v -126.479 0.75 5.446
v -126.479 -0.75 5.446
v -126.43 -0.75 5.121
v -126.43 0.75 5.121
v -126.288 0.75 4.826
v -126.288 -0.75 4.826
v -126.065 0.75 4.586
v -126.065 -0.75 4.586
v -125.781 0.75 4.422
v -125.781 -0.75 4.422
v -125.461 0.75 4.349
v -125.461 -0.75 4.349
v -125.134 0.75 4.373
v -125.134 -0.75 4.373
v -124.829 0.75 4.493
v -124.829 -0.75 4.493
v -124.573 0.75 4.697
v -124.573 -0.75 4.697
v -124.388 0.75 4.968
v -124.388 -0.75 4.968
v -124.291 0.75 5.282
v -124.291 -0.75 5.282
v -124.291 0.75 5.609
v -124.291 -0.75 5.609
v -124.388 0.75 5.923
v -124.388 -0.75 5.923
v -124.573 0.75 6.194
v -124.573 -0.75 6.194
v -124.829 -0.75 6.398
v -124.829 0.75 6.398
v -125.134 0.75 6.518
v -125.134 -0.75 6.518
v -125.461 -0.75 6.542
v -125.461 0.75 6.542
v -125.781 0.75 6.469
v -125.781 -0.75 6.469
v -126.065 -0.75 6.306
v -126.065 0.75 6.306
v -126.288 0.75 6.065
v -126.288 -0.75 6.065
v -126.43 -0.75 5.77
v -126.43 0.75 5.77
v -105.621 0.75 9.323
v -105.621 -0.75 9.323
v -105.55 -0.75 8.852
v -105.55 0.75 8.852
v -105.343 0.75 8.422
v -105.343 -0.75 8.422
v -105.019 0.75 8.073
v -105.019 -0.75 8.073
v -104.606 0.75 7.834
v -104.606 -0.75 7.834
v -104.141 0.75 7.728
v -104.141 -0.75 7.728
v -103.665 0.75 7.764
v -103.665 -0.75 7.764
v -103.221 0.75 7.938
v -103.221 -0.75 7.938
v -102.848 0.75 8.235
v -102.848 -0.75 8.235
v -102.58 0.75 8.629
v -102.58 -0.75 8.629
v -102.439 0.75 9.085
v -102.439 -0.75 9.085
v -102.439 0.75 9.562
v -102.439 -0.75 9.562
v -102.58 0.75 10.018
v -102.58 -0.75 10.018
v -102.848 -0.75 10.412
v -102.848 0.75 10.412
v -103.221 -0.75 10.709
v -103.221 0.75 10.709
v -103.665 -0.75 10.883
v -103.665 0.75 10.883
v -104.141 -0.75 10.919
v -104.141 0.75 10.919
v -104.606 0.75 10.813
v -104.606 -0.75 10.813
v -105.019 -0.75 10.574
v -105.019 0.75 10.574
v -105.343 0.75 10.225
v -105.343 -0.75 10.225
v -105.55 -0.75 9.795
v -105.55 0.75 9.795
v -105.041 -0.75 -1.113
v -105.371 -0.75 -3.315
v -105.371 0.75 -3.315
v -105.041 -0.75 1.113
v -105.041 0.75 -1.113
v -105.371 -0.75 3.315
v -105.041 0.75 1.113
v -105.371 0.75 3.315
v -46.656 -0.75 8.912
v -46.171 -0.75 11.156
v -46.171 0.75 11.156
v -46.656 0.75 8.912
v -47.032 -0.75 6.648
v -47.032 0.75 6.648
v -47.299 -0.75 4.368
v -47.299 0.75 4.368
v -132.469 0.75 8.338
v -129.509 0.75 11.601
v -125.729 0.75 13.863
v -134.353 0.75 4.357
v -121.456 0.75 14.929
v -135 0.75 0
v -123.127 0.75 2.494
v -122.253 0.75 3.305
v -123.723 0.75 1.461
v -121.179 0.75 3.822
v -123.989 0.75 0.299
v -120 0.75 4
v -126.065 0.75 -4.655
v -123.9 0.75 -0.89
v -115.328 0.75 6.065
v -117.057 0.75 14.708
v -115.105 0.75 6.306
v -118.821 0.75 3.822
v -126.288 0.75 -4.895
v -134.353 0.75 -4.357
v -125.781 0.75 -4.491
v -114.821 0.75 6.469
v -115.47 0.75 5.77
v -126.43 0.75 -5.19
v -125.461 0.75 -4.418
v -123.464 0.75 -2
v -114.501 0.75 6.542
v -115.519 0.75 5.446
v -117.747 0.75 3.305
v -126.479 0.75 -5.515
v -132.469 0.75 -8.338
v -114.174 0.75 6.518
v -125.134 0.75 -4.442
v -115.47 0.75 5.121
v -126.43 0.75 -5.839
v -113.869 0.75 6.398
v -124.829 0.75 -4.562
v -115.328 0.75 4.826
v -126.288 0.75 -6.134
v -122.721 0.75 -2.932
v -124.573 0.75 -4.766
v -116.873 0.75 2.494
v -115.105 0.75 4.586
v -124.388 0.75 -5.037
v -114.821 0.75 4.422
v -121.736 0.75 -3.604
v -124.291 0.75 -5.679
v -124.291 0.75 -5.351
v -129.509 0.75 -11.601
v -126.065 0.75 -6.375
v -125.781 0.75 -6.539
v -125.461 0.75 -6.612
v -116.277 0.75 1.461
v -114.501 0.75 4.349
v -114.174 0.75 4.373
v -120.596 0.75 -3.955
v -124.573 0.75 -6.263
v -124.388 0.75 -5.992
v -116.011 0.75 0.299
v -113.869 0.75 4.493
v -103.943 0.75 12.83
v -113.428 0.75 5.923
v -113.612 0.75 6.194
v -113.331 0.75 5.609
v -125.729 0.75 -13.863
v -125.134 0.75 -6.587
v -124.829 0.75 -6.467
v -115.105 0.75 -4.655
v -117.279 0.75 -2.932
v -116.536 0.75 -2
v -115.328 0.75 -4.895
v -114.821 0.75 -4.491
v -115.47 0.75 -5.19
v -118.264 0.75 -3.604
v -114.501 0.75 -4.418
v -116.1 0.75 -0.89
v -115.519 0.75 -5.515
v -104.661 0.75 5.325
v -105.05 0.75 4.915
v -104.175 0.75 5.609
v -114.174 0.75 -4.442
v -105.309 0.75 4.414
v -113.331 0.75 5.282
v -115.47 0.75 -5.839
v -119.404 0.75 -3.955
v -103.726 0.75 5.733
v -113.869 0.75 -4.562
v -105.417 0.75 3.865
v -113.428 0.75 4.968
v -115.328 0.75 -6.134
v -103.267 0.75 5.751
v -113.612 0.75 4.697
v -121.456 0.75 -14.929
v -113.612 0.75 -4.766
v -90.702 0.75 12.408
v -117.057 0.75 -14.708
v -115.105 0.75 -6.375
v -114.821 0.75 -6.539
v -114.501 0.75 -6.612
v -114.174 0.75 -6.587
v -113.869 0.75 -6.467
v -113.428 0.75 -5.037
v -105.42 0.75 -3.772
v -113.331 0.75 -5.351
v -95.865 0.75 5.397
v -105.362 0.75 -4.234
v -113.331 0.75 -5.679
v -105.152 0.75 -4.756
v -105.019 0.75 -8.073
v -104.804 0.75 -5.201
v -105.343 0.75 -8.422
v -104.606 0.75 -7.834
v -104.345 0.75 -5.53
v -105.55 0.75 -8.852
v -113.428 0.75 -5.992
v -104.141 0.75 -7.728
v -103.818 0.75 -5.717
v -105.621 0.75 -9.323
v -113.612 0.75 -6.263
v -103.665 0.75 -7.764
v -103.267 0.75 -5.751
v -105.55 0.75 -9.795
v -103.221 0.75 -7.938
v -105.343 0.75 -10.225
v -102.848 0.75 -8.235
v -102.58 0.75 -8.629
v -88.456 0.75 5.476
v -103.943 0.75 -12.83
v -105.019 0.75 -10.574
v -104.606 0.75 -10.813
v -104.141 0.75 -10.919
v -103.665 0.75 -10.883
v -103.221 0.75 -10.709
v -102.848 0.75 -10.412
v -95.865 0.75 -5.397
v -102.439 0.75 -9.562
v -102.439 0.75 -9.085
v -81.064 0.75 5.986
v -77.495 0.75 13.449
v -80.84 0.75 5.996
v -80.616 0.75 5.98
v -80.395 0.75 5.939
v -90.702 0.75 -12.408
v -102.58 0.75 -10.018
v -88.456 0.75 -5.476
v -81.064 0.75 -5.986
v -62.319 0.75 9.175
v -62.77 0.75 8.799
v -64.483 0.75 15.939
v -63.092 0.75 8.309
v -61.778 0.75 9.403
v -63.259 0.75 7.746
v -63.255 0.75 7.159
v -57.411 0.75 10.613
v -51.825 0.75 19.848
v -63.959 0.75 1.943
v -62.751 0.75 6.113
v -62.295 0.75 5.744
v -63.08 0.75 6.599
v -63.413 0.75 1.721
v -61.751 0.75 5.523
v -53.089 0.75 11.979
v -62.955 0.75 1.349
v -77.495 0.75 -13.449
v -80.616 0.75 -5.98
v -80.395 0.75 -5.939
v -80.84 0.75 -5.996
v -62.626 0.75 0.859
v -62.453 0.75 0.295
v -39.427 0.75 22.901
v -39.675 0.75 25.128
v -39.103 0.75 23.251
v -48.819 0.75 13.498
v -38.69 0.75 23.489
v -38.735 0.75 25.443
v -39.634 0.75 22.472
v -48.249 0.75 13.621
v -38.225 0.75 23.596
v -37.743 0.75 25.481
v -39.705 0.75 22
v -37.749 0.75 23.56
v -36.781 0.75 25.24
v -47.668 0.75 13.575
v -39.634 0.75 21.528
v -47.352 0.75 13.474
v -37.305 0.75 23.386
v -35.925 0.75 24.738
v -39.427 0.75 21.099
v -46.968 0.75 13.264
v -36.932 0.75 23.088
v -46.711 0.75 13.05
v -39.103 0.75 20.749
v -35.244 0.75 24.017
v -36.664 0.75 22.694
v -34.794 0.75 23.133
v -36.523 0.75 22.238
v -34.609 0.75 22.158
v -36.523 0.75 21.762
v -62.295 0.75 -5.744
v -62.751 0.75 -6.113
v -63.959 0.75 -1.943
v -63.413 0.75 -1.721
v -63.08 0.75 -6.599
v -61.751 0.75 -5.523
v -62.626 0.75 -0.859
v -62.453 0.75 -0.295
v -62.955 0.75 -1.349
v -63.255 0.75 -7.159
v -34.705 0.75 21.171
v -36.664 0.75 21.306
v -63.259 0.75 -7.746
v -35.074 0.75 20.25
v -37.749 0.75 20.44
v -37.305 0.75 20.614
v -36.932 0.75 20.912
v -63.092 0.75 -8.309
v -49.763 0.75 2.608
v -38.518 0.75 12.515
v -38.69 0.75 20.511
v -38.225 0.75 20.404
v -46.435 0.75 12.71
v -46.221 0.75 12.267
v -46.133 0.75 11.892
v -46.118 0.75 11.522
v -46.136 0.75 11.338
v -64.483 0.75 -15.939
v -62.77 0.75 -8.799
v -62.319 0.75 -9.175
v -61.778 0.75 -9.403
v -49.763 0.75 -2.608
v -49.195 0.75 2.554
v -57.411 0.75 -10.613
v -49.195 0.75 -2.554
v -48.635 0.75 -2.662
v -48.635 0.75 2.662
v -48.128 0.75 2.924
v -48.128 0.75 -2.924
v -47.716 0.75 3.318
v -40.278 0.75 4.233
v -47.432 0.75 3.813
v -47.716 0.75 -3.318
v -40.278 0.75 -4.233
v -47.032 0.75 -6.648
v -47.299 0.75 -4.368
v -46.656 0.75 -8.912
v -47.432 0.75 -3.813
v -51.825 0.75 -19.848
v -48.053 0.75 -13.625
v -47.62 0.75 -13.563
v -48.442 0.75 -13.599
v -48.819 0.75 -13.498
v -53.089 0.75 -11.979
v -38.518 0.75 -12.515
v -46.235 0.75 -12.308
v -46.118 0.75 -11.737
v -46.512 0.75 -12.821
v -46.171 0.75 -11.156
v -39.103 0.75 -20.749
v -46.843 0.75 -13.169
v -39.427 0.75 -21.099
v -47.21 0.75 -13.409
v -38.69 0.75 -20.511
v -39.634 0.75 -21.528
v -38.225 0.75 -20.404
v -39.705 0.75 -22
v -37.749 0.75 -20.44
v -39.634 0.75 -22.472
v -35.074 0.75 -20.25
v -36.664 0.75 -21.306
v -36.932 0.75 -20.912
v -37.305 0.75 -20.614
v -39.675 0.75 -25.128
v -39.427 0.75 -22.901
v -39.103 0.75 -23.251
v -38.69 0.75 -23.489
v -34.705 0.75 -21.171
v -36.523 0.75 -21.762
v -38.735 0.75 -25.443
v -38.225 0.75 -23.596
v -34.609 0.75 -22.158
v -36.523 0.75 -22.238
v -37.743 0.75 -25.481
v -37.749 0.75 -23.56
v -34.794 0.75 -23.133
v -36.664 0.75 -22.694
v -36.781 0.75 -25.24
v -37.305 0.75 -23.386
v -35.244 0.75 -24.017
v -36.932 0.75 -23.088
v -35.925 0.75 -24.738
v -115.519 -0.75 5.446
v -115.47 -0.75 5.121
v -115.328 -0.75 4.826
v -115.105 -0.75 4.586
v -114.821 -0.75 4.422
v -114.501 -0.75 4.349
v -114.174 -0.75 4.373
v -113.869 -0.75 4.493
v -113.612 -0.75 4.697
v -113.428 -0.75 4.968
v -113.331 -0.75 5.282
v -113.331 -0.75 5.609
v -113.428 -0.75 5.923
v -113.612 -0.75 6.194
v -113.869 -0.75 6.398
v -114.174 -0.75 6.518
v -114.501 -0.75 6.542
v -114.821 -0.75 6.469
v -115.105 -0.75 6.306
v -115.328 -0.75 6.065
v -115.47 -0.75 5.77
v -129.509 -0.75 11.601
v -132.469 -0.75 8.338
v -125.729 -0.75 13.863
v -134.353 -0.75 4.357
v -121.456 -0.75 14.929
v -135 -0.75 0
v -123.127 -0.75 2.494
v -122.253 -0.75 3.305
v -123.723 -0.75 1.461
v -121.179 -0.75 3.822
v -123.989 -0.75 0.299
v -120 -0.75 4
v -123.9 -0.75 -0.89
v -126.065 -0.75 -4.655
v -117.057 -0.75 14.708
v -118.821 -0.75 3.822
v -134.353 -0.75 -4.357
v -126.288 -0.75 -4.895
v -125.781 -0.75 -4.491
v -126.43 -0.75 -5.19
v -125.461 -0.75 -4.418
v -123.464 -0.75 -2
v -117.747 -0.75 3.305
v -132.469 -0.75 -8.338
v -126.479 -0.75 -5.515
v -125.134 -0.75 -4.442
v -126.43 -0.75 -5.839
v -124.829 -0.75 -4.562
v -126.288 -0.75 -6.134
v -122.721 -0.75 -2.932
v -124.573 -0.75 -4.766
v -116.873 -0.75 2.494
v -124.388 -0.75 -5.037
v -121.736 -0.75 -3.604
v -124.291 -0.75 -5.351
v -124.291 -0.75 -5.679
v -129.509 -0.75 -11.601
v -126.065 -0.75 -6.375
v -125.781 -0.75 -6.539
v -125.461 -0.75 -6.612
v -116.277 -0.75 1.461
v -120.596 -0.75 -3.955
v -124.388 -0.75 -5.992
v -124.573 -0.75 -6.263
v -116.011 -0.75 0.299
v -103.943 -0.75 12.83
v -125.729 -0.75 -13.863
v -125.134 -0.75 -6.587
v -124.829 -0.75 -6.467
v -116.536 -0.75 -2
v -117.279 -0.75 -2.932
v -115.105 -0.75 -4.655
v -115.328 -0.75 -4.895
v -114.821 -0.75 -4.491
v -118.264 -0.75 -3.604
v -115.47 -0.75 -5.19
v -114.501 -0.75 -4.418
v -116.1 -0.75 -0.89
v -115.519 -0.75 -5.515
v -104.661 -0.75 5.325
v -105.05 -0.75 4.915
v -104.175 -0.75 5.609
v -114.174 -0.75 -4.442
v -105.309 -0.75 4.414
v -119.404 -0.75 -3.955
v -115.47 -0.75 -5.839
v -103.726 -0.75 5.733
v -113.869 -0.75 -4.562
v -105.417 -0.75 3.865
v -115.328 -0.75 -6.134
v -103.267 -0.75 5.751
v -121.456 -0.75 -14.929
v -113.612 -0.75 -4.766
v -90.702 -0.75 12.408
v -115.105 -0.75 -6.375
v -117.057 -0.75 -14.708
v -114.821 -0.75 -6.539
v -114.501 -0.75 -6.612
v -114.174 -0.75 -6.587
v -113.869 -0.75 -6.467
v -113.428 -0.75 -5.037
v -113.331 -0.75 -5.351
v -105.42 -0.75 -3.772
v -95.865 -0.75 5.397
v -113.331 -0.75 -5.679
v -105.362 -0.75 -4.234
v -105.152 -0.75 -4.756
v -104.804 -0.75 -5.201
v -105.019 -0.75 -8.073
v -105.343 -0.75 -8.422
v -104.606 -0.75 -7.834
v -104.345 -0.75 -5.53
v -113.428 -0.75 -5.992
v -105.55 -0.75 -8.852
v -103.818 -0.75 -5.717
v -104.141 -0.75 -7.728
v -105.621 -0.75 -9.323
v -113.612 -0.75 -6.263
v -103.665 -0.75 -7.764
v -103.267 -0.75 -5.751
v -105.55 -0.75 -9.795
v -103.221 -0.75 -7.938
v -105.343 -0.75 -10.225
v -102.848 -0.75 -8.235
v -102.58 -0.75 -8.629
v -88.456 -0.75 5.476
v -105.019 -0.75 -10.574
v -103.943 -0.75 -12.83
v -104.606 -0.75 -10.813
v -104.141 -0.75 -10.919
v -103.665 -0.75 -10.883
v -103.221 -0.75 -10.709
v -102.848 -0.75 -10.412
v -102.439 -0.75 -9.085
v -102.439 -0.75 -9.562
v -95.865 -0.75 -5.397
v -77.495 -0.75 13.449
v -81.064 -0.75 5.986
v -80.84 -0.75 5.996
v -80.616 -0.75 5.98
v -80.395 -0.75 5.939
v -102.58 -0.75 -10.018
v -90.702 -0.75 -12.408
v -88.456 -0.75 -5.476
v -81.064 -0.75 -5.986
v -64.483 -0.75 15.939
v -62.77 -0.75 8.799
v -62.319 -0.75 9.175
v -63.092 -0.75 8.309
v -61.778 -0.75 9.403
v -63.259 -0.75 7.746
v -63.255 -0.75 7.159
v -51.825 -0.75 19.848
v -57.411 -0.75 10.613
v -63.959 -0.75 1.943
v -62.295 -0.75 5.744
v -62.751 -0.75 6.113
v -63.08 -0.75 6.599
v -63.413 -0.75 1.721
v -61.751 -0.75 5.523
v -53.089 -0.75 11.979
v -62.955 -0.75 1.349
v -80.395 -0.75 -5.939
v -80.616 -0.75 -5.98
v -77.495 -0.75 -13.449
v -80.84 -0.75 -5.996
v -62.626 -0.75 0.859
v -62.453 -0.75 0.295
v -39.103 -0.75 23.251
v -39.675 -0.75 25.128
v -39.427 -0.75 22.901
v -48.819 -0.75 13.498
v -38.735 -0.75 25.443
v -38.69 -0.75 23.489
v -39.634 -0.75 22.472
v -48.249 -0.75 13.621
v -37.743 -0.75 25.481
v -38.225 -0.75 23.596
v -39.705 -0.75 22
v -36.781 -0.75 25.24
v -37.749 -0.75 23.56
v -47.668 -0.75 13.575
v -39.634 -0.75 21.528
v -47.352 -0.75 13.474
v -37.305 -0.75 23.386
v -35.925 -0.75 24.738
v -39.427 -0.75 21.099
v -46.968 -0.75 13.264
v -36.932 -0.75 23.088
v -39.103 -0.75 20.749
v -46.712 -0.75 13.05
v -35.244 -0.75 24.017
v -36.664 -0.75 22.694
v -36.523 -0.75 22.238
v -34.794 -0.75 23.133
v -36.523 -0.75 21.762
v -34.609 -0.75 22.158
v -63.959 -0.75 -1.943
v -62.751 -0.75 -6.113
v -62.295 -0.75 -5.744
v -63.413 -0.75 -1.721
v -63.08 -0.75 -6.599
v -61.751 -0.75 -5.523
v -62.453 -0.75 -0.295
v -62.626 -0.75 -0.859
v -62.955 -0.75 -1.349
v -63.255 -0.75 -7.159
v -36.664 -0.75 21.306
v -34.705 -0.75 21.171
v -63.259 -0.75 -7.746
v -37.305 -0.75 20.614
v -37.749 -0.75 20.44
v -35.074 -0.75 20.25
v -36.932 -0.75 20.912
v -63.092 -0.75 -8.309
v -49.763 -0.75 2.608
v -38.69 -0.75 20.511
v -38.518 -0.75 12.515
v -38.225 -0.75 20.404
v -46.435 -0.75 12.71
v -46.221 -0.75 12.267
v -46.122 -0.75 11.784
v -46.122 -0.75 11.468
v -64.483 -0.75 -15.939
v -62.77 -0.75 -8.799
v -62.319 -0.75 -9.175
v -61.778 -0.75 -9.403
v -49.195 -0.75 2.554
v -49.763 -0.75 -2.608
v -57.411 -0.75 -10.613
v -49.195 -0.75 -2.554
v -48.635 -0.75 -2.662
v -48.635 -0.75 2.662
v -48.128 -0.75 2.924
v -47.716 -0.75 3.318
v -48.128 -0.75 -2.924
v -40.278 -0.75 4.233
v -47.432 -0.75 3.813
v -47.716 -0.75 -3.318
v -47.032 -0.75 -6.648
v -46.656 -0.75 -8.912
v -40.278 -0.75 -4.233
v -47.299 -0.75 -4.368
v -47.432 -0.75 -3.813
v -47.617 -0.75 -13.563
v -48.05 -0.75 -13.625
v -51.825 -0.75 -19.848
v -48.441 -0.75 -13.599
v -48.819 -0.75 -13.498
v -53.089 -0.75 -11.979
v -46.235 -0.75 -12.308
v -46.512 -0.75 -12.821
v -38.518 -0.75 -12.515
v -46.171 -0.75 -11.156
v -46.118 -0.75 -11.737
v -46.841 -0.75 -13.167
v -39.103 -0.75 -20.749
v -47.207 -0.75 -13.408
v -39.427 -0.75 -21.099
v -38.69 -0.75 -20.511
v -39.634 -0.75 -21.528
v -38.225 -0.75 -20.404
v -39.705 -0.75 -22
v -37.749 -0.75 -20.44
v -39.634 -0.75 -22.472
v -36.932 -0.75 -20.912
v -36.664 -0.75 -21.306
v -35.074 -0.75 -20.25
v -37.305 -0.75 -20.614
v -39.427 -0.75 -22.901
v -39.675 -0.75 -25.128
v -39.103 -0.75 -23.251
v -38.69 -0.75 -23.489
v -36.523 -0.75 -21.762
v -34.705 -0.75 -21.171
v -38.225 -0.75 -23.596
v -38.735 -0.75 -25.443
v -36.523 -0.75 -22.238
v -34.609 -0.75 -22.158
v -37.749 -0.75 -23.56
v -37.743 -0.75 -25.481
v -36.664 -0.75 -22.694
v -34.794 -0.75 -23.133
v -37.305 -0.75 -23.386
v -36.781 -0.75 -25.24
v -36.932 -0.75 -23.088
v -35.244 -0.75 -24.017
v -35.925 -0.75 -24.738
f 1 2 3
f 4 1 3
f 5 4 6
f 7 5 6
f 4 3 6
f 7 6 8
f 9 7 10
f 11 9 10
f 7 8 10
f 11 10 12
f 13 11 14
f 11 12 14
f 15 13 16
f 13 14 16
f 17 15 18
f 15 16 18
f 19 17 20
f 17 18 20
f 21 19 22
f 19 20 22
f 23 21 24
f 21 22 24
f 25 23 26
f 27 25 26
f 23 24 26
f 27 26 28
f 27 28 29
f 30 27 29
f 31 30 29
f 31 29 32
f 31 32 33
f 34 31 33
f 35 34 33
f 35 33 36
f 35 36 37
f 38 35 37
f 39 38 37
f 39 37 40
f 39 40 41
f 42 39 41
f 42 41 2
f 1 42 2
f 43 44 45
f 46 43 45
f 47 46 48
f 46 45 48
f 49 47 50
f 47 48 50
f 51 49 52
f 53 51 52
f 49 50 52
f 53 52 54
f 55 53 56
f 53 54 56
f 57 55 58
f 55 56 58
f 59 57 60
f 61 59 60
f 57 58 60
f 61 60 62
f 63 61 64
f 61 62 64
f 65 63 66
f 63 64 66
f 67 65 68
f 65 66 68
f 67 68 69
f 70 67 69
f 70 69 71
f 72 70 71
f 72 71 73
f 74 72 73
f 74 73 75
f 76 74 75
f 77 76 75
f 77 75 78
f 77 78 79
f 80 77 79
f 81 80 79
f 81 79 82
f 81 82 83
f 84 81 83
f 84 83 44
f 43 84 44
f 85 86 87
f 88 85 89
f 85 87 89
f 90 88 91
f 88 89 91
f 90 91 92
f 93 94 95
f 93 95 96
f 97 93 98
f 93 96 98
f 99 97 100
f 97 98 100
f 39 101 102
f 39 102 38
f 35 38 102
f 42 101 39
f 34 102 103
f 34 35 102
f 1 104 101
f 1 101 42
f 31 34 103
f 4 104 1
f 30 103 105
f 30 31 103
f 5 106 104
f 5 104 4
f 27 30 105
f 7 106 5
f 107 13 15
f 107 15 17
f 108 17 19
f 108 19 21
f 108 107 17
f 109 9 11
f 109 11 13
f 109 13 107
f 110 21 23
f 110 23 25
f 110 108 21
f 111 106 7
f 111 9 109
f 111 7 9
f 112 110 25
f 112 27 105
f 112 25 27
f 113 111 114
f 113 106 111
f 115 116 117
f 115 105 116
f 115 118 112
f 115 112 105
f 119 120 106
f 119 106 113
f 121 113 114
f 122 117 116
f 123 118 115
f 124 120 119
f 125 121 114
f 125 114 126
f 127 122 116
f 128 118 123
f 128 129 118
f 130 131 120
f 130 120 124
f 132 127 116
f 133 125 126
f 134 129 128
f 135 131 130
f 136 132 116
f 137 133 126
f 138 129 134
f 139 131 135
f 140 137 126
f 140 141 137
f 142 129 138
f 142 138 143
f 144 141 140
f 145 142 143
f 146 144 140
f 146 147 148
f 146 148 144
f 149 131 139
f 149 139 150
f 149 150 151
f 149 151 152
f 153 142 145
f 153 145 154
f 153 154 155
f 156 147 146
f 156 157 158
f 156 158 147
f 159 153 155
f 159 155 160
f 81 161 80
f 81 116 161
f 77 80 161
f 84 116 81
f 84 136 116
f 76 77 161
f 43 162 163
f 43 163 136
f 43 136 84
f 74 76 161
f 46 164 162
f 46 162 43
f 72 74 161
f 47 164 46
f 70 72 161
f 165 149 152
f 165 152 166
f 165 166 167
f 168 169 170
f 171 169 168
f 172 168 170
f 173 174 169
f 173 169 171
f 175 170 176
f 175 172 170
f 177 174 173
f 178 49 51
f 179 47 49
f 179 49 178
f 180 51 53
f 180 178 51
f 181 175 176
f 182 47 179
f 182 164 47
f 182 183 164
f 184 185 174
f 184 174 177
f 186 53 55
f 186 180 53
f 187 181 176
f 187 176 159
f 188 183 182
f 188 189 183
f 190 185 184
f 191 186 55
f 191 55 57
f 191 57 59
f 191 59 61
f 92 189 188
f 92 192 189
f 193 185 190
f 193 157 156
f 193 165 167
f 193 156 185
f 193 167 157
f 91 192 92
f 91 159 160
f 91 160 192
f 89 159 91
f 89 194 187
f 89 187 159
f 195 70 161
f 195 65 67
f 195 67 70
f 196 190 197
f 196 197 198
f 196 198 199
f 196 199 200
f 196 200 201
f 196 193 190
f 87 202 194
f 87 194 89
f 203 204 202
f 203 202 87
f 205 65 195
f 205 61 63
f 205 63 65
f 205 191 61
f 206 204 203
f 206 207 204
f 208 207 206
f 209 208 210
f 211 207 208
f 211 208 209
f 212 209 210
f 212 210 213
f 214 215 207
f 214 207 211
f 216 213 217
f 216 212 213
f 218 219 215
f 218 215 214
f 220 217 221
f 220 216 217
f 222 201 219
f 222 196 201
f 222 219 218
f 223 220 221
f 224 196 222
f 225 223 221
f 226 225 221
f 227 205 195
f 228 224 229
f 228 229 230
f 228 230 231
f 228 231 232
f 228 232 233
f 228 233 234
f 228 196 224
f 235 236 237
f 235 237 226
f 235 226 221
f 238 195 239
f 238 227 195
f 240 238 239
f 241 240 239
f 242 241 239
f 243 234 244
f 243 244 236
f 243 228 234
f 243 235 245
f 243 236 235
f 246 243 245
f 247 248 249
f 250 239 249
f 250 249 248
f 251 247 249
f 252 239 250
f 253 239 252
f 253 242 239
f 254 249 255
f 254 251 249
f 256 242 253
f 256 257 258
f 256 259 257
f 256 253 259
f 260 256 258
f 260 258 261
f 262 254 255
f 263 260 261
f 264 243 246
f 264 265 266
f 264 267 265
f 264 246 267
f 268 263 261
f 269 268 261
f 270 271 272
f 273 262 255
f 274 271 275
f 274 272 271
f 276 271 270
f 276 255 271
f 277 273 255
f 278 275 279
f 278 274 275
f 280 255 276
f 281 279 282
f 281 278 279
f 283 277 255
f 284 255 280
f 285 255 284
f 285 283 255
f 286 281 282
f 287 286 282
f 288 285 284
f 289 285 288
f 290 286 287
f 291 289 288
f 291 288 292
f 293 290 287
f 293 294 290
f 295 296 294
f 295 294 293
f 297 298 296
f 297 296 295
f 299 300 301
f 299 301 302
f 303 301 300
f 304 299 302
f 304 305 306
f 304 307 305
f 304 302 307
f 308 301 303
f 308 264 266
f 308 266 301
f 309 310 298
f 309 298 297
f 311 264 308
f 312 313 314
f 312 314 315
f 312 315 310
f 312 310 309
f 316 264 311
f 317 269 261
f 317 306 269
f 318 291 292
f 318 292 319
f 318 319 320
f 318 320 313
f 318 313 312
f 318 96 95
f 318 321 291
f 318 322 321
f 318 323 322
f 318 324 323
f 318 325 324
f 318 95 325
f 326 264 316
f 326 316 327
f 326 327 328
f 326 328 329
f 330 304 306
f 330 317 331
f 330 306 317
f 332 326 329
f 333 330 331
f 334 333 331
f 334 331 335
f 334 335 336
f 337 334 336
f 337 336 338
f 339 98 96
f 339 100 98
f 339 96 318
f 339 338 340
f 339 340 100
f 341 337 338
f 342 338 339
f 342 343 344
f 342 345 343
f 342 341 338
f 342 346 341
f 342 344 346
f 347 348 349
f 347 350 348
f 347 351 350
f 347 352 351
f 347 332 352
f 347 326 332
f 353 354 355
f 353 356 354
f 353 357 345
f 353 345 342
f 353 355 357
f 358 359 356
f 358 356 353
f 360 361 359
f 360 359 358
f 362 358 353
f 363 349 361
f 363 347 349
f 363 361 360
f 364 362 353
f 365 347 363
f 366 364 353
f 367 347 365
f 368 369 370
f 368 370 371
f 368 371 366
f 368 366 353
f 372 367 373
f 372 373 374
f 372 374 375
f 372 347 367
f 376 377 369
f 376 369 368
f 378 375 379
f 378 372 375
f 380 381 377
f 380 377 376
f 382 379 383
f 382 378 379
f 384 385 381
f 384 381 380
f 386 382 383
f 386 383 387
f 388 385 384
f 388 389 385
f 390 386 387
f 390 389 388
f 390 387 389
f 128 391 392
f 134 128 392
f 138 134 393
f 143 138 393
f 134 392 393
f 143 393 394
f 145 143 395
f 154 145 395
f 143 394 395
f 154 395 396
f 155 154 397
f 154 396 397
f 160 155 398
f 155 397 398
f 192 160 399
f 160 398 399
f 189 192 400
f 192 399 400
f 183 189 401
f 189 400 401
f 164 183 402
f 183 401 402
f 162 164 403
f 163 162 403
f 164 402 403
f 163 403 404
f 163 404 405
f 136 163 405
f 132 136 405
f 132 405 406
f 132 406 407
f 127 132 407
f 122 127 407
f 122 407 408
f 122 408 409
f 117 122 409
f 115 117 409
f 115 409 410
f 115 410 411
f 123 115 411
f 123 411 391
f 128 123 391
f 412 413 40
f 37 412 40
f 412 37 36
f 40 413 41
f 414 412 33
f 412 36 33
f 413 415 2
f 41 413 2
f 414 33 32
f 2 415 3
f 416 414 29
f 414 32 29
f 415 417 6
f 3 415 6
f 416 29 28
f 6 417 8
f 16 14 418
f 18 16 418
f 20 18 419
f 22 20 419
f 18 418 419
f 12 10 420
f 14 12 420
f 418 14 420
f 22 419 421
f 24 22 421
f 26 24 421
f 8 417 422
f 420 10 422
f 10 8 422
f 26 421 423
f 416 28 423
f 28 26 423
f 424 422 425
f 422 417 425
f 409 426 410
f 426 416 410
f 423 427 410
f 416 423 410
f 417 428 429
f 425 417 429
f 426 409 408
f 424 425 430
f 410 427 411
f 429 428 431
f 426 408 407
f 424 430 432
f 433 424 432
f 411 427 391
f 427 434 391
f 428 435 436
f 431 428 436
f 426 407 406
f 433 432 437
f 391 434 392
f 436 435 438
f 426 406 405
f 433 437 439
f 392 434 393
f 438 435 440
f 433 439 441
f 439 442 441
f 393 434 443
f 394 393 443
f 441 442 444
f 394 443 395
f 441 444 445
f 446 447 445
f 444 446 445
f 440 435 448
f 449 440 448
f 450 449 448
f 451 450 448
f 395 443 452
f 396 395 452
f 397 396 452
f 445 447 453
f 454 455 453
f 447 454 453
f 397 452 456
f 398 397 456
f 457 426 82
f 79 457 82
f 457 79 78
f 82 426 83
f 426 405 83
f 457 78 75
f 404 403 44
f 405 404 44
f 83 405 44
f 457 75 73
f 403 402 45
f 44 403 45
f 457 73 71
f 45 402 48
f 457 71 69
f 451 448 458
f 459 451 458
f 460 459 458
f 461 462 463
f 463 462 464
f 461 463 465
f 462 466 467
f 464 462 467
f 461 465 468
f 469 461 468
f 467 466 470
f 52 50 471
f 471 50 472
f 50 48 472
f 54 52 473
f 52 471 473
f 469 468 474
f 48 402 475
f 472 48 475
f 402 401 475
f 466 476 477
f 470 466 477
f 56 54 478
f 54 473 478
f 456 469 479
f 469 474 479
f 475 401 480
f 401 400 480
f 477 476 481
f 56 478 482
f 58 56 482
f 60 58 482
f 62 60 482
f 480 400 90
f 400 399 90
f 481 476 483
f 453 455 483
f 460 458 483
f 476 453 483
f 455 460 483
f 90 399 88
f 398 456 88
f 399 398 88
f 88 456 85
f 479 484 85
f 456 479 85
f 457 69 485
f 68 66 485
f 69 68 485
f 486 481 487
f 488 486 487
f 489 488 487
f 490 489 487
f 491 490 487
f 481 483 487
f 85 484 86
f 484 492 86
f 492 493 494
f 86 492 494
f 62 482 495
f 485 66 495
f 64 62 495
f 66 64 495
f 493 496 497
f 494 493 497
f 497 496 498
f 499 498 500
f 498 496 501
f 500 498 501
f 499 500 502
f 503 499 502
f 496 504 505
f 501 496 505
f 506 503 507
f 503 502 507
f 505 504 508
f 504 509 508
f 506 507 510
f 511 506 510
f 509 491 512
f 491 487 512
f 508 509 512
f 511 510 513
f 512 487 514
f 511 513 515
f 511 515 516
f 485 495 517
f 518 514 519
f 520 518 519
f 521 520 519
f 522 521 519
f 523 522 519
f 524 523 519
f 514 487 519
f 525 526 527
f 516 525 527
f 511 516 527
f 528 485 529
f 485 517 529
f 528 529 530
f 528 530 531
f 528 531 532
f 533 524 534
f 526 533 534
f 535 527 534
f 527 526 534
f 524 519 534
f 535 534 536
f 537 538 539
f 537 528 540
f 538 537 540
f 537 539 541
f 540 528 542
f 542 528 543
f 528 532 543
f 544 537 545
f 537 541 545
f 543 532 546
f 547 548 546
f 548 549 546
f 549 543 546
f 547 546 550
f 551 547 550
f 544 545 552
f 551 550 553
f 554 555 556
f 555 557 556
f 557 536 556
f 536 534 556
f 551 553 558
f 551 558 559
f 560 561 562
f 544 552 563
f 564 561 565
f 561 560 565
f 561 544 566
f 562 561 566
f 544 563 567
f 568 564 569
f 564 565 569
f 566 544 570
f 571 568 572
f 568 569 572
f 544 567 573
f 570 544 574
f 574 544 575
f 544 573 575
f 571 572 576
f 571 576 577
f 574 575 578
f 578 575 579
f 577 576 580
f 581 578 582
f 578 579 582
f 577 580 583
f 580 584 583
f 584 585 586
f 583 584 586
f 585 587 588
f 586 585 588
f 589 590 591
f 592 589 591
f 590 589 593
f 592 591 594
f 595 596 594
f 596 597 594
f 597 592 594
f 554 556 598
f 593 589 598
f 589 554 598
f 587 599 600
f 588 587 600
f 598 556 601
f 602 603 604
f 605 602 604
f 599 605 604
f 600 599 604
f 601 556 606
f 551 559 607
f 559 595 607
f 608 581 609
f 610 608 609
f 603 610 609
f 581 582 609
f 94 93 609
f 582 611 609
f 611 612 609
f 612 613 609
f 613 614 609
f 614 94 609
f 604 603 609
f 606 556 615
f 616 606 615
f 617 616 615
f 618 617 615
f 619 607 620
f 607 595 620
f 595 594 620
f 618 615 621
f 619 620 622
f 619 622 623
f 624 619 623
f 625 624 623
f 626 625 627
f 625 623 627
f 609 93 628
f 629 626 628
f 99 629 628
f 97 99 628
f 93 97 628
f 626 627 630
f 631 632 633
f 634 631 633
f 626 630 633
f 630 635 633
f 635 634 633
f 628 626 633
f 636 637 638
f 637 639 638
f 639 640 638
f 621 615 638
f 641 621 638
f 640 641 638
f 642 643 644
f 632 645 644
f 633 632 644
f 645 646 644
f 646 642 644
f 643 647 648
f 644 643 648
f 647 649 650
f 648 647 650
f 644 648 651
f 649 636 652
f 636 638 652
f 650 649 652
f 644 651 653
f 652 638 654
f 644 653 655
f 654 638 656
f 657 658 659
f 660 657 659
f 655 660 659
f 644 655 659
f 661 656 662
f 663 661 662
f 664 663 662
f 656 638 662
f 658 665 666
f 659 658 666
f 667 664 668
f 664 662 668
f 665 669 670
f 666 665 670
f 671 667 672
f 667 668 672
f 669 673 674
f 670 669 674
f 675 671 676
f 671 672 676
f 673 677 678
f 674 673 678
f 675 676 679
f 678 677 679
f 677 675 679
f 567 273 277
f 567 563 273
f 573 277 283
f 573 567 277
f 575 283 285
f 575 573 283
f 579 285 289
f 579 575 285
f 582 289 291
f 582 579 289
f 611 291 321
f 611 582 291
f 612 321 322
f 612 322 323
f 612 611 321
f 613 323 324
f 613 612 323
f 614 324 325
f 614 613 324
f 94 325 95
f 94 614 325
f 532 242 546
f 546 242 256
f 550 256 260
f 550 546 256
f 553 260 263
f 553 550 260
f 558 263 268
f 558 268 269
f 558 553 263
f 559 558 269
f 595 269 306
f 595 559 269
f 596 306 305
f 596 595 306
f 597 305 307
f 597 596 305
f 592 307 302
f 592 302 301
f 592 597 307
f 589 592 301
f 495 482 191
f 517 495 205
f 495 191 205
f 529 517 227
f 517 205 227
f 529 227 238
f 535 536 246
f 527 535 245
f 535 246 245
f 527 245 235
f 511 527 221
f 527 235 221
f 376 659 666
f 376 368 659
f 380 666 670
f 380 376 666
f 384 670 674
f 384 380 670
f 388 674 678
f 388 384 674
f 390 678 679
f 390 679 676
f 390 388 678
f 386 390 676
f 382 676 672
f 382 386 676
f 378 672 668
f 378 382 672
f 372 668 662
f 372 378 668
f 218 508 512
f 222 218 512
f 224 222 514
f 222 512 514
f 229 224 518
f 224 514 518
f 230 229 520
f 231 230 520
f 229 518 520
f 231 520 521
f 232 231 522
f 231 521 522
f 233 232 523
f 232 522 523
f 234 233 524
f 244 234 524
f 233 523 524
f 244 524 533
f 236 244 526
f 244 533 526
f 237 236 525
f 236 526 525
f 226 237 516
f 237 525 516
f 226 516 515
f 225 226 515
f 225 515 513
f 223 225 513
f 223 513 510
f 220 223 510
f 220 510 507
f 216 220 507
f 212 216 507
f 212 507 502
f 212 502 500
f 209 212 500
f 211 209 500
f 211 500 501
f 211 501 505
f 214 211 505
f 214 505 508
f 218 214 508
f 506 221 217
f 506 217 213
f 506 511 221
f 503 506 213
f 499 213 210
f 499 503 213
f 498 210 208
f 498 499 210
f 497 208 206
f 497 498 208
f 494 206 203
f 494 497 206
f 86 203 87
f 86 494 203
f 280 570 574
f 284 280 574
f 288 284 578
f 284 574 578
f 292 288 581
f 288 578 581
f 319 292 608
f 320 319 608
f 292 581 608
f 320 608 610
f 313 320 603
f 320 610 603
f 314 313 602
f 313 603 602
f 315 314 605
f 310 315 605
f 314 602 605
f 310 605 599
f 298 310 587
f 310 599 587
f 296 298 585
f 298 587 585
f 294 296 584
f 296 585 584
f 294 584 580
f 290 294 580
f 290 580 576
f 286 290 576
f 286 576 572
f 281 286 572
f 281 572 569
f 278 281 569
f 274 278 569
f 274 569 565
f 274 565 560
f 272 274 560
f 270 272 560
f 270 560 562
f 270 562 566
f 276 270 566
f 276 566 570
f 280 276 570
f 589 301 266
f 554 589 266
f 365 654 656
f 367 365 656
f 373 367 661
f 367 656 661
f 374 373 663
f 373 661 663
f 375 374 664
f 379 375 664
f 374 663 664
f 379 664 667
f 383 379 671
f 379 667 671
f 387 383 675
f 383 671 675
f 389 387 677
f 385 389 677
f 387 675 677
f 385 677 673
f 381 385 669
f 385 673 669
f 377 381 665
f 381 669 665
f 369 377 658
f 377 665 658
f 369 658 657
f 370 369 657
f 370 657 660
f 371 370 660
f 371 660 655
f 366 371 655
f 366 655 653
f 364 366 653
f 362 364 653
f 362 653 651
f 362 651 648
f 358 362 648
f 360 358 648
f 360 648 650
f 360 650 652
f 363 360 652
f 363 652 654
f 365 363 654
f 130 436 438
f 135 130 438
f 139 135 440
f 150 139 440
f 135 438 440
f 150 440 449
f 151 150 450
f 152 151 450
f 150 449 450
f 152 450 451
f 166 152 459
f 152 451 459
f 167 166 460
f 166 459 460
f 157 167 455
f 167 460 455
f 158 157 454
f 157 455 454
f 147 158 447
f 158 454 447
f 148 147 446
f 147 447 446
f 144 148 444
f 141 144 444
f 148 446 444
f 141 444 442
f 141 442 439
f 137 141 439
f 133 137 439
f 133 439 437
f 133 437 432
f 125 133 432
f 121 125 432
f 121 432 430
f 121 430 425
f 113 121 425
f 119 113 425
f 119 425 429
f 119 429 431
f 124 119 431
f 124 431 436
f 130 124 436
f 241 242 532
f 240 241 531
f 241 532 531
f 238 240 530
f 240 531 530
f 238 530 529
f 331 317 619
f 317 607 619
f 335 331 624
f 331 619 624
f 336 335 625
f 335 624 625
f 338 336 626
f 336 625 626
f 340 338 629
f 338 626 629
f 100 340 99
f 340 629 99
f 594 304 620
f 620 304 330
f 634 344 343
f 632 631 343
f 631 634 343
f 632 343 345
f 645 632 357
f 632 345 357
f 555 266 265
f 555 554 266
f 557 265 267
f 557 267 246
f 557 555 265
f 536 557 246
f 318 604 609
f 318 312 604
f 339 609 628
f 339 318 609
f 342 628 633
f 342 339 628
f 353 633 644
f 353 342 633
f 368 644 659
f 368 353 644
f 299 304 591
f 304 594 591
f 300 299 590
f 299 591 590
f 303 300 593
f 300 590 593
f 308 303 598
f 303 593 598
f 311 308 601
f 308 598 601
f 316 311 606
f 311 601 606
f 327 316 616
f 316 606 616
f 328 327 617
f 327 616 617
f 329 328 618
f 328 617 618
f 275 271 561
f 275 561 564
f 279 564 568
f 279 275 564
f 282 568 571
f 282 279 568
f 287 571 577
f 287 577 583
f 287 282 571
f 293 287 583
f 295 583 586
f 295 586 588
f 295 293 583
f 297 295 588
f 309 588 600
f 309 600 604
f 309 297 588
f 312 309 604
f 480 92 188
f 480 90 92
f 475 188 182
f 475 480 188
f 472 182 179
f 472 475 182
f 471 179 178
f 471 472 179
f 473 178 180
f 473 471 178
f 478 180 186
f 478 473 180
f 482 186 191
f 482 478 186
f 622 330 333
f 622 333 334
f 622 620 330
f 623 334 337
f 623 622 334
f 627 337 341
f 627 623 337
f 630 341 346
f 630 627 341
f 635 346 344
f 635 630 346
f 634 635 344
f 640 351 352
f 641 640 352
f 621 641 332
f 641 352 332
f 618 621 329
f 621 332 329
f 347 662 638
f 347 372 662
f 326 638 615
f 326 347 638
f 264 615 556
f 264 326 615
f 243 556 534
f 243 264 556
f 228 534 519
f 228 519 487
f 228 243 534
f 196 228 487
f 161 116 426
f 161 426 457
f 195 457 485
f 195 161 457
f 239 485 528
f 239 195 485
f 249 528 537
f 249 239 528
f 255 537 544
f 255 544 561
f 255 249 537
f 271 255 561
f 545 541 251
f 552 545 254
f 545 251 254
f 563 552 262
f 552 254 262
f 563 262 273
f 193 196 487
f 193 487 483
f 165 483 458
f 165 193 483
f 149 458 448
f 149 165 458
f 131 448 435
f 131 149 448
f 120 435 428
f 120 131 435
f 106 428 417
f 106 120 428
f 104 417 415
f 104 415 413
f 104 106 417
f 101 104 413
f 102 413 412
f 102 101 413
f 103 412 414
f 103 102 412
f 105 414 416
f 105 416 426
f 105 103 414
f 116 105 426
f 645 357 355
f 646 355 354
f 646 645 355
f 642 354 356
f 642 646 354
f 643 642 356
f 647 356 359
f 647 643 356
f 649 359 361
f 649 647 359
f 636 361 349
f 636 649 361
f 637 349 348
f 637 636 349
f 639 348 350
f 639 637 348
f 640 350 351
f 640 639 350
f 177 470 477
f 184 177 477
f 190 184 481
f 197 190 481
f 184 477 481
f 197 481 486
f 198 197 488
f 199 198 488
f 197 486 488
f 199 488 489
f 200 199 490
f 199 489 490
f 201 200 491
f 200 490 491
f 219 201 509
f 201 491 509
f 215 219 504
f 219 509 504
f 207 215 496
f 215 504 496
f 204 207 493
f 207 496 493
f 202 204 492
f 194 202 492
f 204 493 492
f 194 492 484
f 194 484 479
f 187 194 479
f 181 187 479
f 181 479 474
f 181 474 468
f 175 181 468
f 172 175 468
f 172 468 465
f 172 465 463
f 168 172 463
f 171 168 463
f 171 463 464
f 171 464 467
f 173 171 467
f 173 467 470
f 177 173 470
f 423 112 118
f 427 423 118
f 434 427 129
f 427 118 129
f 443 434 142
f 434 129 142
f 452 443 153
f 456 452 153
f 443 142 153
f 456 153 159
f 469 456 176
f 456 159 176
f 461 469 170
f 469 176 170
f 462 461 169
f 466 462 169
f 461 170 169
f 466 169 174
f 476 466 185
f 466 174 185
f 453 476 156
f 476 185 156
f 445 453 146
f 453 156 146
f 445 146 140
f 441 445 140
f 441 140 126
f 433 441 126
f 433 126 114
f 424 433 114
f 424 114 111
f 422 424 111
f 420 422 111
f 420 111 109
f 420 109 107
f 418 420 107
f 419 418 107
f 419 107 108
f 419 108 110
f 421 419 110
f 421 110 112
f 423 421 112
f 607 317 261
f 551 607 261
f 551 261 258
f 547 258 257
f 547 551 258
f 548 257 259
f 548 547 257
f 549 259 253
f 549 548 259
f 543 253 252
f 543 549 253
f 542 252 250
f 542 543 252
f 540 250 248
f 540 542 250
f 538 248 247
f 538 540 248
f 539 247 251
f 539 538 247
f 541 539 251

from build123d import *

# Parameters (mm, degrees)
SKETCH1_R                      = 3.5
BOSS_EXTRUDE1_DEPTH            = 0.75
F_2_2_2_2_DIAMETER_HOLE1_D     = 2.2
F_3_2_3_2_DIAMETER_HOLE1_D     = 3.2
F_3_2_3_2_DIAMETER_HOLE1_DEPTH = 10
F_3_2_3_2_DIAMETER_HOLE1_TIP   = 0.96137699
CUT_EXTRUDE1_DEPTH             = 138.395414771
FILLET1_R                      = 2
SKETCH7_R                      = 4
CUT_EXTRUDE2_DEPTH             = 138.395414889


with BuildPart() as part:
    # Sketch1 → Boss-Extrude1 (new, symmetric)
    with BuildSketch(Plane(origin=(0, 0, 0), x_dir=(1, 0, 0), z_dir=(0, 1, 0))):
        with BuildLine():
            ThreePointArc((-41.13620668, -23.75), (-47.5, 0), (-41.13620668, 23.75))
            ThreePointArc((-41.13620668, 23.75), (-40.506696415, 24.5460597), (-39.675258631, 25.128043744))
            ThreePointArc((-39.675258631, 25.128043744), (-77.494729166, 13.448582828), (-117.056517742, 14.708361982))
            ThreePointArc((-117.056517742, 14.708361982), (-135, 0), (-117.056517742, -14.708361982))
            ThreePointArc((-117.056517742, -14.708361982), (-77.494729166, -13.448582828), (-39.675258631, -25.128043744))
            ThreePointArc((-39.675258631, -25.128043744), (-40.506696415, -24.5460597), (-41.13620668, -23.75))
        make_face()
        with BuildLine():
            ThreePointArc((-35.074028853, 20.25), (-39.855117767, 18.968911087), (-41.13620668, 23.75))
            ThreePointArc((-41.13620668, 23.75), (-47.5, 0), (-41.13620668, -23.75))
            ThreePointArc((-41.13620668, -23.75), (-39.855117767, -18.968911087), (-35.074028853, -20.25))
            ThreePointArc((-35.074028853, -20.25), (-40.5, 0), (-35.074028853, 20.25))
        make_face()
        with Locations((-38.105117767, -22)):
            Circle(SKETCH1_R)
        with Locations((-38.105117767, 22)):
            Circle(SKETCH1_R)
    extrude(amount=BOSS_EXTRUDE1_DEPTH, both=True)

    # Ø2.2 (2.2) Diameter Hole1 (through all)
    with Locations(Plane(origin=(0, 0.75, 0), x_dir=(1, 0, 0), z_dir=(0, 1, 0))):
        with Locations((-125.378942435, 5.51463095), (-114.418787327, 5.51463095), (-114.418787327, -5.445524158), (-125.378942435, -5.445524158)):
            Hole(F_2_2_2_2_DIAMETER_HOLE1_D / 2)

    # Ø3.2 (3.2) Diameter Hole1
    with Locations(Plane(origin=(0, 0.75, 0), x_dir=(1, 0, 0), z_dir=(0, 1, 0))):
        with Locations((-38.105117767, 22), (-38.105117767, -22), (-104.021186711, 9.323493222), (-104.021186711, -9.323493222)):
            Hole(F_3_2_3_2_DIAMETER_HOLE1_D / 2, depth=F_3_2_3_2_DIAMETER_HOLE1_DEPTH)
            with Locations((0, 0, -(F_3_2_3_2_DIAMETER_HOLE1_DEPTH + F_3_2_3_2_DIAMETER_HOLE1_TIP / 2))):  # 118° drill point
                Cone(0, F_3_2_3_2_DIAMETER_HOLE1_D / 2, F_3_2_3_2_DIAMETER_HOLE1_TIP, mode=Mode.SUBTRACT)

    # Sketch6 → Cut-Extrude1 (cut, through all)
    with BuildSketch(Plane(origin=(0, 0.75, 0), x_dir=(1, 0, 0), z_dir=(0, 1, 0))):
        with BuildLine():
            Line((-80.72687621, -6.02009961), (-55.965778938, 0))
            Line((-55.965778938, 0), (-80.72687621, 6.02009961))
            ThreePointArc((-80.72687621, 6.02009961), (-93.493210894, 5.375258779), (-106.259702082, 6.016993695))
            ThreePointArc((-106.259702082, 6.016993695), (-105, 0), (-106.259702082, -6.016993695))
            ThreePointArc((-106.259702082, -6.016993695), (-93.493210894, -5.375258779), (-80.72687621, -6.02009961))
        make_face()
        with BuildLine():
            Line((-70.096059807, 7.551982097), (-47.45584926, 2.047528026))
            ThreePointArc((-47.45584926, 2.047528026), (-46.716397825, 8.592332297), (-45.078723321, 14.971930527))
            ThreePointArc((-45.078723321, 14.971930527), (-57.396315368, 10.61771767), (-70.096059807, 7.551982097))
        make_face()
        with BuildLine():
            ThreePointArc((-45.078723321, -14.971930527), (-46.716397825, -8.592332297), (-47.45584926, -2.047528026))
            Line((-47.45584926, -2.047528026), (-70.096059807, -7.551982097))
            ThreePointArc((-70.096059807, -7.551982097), (-57.396315368, -10.61771767), (-45.078723321, -14.971930527))
        make_face()
    extrude(amount=-CUT_EXTRUDE1_DEPTH, mode=Mode.SUBTRACT)

    # Fillet1
    fillet1_edges = [part.edges().sort_by_distance(p)[0] for p in [
        (-47.45584926, 0, 2.047528026),
        (-45.078723321, 0, 14.971930527),
        (-70.096059807, 0, 7.551982097),
        (-106.259702082, 0, 6.016993695),
        (-106.259702082, 0, -6.016993695),
        (-80.72687621, 0, -6.02009961),
        (-55.965778938, 0, 0),
        (-80.72687621, 0, 6.02009961),
        (-45.078723321, 0, -14.971930527),
        (-47.45584926, 0, -2.047528026),
        (-70.096059807, 0, -7.551982097),
    ]]
    fillet(fillet1_edges, radius=FILLET1_R)

    # Sketch7 → Cut-Extrude2 (cut, through all)
    with BuildSketch(Plane(origin=(0, 0.75, 0), x_dir=(1, 0, 0), z_dir=(0, 1, 0))):
        with Locations(Location((-120, 0, 0), (0, 0, 270))):
            Circle(SKETCH7_R)
    extrude(amount=-CUT_EXTRUDE2_DEPTH, mode=Mode.SUBTRACT)


solid = part.part
